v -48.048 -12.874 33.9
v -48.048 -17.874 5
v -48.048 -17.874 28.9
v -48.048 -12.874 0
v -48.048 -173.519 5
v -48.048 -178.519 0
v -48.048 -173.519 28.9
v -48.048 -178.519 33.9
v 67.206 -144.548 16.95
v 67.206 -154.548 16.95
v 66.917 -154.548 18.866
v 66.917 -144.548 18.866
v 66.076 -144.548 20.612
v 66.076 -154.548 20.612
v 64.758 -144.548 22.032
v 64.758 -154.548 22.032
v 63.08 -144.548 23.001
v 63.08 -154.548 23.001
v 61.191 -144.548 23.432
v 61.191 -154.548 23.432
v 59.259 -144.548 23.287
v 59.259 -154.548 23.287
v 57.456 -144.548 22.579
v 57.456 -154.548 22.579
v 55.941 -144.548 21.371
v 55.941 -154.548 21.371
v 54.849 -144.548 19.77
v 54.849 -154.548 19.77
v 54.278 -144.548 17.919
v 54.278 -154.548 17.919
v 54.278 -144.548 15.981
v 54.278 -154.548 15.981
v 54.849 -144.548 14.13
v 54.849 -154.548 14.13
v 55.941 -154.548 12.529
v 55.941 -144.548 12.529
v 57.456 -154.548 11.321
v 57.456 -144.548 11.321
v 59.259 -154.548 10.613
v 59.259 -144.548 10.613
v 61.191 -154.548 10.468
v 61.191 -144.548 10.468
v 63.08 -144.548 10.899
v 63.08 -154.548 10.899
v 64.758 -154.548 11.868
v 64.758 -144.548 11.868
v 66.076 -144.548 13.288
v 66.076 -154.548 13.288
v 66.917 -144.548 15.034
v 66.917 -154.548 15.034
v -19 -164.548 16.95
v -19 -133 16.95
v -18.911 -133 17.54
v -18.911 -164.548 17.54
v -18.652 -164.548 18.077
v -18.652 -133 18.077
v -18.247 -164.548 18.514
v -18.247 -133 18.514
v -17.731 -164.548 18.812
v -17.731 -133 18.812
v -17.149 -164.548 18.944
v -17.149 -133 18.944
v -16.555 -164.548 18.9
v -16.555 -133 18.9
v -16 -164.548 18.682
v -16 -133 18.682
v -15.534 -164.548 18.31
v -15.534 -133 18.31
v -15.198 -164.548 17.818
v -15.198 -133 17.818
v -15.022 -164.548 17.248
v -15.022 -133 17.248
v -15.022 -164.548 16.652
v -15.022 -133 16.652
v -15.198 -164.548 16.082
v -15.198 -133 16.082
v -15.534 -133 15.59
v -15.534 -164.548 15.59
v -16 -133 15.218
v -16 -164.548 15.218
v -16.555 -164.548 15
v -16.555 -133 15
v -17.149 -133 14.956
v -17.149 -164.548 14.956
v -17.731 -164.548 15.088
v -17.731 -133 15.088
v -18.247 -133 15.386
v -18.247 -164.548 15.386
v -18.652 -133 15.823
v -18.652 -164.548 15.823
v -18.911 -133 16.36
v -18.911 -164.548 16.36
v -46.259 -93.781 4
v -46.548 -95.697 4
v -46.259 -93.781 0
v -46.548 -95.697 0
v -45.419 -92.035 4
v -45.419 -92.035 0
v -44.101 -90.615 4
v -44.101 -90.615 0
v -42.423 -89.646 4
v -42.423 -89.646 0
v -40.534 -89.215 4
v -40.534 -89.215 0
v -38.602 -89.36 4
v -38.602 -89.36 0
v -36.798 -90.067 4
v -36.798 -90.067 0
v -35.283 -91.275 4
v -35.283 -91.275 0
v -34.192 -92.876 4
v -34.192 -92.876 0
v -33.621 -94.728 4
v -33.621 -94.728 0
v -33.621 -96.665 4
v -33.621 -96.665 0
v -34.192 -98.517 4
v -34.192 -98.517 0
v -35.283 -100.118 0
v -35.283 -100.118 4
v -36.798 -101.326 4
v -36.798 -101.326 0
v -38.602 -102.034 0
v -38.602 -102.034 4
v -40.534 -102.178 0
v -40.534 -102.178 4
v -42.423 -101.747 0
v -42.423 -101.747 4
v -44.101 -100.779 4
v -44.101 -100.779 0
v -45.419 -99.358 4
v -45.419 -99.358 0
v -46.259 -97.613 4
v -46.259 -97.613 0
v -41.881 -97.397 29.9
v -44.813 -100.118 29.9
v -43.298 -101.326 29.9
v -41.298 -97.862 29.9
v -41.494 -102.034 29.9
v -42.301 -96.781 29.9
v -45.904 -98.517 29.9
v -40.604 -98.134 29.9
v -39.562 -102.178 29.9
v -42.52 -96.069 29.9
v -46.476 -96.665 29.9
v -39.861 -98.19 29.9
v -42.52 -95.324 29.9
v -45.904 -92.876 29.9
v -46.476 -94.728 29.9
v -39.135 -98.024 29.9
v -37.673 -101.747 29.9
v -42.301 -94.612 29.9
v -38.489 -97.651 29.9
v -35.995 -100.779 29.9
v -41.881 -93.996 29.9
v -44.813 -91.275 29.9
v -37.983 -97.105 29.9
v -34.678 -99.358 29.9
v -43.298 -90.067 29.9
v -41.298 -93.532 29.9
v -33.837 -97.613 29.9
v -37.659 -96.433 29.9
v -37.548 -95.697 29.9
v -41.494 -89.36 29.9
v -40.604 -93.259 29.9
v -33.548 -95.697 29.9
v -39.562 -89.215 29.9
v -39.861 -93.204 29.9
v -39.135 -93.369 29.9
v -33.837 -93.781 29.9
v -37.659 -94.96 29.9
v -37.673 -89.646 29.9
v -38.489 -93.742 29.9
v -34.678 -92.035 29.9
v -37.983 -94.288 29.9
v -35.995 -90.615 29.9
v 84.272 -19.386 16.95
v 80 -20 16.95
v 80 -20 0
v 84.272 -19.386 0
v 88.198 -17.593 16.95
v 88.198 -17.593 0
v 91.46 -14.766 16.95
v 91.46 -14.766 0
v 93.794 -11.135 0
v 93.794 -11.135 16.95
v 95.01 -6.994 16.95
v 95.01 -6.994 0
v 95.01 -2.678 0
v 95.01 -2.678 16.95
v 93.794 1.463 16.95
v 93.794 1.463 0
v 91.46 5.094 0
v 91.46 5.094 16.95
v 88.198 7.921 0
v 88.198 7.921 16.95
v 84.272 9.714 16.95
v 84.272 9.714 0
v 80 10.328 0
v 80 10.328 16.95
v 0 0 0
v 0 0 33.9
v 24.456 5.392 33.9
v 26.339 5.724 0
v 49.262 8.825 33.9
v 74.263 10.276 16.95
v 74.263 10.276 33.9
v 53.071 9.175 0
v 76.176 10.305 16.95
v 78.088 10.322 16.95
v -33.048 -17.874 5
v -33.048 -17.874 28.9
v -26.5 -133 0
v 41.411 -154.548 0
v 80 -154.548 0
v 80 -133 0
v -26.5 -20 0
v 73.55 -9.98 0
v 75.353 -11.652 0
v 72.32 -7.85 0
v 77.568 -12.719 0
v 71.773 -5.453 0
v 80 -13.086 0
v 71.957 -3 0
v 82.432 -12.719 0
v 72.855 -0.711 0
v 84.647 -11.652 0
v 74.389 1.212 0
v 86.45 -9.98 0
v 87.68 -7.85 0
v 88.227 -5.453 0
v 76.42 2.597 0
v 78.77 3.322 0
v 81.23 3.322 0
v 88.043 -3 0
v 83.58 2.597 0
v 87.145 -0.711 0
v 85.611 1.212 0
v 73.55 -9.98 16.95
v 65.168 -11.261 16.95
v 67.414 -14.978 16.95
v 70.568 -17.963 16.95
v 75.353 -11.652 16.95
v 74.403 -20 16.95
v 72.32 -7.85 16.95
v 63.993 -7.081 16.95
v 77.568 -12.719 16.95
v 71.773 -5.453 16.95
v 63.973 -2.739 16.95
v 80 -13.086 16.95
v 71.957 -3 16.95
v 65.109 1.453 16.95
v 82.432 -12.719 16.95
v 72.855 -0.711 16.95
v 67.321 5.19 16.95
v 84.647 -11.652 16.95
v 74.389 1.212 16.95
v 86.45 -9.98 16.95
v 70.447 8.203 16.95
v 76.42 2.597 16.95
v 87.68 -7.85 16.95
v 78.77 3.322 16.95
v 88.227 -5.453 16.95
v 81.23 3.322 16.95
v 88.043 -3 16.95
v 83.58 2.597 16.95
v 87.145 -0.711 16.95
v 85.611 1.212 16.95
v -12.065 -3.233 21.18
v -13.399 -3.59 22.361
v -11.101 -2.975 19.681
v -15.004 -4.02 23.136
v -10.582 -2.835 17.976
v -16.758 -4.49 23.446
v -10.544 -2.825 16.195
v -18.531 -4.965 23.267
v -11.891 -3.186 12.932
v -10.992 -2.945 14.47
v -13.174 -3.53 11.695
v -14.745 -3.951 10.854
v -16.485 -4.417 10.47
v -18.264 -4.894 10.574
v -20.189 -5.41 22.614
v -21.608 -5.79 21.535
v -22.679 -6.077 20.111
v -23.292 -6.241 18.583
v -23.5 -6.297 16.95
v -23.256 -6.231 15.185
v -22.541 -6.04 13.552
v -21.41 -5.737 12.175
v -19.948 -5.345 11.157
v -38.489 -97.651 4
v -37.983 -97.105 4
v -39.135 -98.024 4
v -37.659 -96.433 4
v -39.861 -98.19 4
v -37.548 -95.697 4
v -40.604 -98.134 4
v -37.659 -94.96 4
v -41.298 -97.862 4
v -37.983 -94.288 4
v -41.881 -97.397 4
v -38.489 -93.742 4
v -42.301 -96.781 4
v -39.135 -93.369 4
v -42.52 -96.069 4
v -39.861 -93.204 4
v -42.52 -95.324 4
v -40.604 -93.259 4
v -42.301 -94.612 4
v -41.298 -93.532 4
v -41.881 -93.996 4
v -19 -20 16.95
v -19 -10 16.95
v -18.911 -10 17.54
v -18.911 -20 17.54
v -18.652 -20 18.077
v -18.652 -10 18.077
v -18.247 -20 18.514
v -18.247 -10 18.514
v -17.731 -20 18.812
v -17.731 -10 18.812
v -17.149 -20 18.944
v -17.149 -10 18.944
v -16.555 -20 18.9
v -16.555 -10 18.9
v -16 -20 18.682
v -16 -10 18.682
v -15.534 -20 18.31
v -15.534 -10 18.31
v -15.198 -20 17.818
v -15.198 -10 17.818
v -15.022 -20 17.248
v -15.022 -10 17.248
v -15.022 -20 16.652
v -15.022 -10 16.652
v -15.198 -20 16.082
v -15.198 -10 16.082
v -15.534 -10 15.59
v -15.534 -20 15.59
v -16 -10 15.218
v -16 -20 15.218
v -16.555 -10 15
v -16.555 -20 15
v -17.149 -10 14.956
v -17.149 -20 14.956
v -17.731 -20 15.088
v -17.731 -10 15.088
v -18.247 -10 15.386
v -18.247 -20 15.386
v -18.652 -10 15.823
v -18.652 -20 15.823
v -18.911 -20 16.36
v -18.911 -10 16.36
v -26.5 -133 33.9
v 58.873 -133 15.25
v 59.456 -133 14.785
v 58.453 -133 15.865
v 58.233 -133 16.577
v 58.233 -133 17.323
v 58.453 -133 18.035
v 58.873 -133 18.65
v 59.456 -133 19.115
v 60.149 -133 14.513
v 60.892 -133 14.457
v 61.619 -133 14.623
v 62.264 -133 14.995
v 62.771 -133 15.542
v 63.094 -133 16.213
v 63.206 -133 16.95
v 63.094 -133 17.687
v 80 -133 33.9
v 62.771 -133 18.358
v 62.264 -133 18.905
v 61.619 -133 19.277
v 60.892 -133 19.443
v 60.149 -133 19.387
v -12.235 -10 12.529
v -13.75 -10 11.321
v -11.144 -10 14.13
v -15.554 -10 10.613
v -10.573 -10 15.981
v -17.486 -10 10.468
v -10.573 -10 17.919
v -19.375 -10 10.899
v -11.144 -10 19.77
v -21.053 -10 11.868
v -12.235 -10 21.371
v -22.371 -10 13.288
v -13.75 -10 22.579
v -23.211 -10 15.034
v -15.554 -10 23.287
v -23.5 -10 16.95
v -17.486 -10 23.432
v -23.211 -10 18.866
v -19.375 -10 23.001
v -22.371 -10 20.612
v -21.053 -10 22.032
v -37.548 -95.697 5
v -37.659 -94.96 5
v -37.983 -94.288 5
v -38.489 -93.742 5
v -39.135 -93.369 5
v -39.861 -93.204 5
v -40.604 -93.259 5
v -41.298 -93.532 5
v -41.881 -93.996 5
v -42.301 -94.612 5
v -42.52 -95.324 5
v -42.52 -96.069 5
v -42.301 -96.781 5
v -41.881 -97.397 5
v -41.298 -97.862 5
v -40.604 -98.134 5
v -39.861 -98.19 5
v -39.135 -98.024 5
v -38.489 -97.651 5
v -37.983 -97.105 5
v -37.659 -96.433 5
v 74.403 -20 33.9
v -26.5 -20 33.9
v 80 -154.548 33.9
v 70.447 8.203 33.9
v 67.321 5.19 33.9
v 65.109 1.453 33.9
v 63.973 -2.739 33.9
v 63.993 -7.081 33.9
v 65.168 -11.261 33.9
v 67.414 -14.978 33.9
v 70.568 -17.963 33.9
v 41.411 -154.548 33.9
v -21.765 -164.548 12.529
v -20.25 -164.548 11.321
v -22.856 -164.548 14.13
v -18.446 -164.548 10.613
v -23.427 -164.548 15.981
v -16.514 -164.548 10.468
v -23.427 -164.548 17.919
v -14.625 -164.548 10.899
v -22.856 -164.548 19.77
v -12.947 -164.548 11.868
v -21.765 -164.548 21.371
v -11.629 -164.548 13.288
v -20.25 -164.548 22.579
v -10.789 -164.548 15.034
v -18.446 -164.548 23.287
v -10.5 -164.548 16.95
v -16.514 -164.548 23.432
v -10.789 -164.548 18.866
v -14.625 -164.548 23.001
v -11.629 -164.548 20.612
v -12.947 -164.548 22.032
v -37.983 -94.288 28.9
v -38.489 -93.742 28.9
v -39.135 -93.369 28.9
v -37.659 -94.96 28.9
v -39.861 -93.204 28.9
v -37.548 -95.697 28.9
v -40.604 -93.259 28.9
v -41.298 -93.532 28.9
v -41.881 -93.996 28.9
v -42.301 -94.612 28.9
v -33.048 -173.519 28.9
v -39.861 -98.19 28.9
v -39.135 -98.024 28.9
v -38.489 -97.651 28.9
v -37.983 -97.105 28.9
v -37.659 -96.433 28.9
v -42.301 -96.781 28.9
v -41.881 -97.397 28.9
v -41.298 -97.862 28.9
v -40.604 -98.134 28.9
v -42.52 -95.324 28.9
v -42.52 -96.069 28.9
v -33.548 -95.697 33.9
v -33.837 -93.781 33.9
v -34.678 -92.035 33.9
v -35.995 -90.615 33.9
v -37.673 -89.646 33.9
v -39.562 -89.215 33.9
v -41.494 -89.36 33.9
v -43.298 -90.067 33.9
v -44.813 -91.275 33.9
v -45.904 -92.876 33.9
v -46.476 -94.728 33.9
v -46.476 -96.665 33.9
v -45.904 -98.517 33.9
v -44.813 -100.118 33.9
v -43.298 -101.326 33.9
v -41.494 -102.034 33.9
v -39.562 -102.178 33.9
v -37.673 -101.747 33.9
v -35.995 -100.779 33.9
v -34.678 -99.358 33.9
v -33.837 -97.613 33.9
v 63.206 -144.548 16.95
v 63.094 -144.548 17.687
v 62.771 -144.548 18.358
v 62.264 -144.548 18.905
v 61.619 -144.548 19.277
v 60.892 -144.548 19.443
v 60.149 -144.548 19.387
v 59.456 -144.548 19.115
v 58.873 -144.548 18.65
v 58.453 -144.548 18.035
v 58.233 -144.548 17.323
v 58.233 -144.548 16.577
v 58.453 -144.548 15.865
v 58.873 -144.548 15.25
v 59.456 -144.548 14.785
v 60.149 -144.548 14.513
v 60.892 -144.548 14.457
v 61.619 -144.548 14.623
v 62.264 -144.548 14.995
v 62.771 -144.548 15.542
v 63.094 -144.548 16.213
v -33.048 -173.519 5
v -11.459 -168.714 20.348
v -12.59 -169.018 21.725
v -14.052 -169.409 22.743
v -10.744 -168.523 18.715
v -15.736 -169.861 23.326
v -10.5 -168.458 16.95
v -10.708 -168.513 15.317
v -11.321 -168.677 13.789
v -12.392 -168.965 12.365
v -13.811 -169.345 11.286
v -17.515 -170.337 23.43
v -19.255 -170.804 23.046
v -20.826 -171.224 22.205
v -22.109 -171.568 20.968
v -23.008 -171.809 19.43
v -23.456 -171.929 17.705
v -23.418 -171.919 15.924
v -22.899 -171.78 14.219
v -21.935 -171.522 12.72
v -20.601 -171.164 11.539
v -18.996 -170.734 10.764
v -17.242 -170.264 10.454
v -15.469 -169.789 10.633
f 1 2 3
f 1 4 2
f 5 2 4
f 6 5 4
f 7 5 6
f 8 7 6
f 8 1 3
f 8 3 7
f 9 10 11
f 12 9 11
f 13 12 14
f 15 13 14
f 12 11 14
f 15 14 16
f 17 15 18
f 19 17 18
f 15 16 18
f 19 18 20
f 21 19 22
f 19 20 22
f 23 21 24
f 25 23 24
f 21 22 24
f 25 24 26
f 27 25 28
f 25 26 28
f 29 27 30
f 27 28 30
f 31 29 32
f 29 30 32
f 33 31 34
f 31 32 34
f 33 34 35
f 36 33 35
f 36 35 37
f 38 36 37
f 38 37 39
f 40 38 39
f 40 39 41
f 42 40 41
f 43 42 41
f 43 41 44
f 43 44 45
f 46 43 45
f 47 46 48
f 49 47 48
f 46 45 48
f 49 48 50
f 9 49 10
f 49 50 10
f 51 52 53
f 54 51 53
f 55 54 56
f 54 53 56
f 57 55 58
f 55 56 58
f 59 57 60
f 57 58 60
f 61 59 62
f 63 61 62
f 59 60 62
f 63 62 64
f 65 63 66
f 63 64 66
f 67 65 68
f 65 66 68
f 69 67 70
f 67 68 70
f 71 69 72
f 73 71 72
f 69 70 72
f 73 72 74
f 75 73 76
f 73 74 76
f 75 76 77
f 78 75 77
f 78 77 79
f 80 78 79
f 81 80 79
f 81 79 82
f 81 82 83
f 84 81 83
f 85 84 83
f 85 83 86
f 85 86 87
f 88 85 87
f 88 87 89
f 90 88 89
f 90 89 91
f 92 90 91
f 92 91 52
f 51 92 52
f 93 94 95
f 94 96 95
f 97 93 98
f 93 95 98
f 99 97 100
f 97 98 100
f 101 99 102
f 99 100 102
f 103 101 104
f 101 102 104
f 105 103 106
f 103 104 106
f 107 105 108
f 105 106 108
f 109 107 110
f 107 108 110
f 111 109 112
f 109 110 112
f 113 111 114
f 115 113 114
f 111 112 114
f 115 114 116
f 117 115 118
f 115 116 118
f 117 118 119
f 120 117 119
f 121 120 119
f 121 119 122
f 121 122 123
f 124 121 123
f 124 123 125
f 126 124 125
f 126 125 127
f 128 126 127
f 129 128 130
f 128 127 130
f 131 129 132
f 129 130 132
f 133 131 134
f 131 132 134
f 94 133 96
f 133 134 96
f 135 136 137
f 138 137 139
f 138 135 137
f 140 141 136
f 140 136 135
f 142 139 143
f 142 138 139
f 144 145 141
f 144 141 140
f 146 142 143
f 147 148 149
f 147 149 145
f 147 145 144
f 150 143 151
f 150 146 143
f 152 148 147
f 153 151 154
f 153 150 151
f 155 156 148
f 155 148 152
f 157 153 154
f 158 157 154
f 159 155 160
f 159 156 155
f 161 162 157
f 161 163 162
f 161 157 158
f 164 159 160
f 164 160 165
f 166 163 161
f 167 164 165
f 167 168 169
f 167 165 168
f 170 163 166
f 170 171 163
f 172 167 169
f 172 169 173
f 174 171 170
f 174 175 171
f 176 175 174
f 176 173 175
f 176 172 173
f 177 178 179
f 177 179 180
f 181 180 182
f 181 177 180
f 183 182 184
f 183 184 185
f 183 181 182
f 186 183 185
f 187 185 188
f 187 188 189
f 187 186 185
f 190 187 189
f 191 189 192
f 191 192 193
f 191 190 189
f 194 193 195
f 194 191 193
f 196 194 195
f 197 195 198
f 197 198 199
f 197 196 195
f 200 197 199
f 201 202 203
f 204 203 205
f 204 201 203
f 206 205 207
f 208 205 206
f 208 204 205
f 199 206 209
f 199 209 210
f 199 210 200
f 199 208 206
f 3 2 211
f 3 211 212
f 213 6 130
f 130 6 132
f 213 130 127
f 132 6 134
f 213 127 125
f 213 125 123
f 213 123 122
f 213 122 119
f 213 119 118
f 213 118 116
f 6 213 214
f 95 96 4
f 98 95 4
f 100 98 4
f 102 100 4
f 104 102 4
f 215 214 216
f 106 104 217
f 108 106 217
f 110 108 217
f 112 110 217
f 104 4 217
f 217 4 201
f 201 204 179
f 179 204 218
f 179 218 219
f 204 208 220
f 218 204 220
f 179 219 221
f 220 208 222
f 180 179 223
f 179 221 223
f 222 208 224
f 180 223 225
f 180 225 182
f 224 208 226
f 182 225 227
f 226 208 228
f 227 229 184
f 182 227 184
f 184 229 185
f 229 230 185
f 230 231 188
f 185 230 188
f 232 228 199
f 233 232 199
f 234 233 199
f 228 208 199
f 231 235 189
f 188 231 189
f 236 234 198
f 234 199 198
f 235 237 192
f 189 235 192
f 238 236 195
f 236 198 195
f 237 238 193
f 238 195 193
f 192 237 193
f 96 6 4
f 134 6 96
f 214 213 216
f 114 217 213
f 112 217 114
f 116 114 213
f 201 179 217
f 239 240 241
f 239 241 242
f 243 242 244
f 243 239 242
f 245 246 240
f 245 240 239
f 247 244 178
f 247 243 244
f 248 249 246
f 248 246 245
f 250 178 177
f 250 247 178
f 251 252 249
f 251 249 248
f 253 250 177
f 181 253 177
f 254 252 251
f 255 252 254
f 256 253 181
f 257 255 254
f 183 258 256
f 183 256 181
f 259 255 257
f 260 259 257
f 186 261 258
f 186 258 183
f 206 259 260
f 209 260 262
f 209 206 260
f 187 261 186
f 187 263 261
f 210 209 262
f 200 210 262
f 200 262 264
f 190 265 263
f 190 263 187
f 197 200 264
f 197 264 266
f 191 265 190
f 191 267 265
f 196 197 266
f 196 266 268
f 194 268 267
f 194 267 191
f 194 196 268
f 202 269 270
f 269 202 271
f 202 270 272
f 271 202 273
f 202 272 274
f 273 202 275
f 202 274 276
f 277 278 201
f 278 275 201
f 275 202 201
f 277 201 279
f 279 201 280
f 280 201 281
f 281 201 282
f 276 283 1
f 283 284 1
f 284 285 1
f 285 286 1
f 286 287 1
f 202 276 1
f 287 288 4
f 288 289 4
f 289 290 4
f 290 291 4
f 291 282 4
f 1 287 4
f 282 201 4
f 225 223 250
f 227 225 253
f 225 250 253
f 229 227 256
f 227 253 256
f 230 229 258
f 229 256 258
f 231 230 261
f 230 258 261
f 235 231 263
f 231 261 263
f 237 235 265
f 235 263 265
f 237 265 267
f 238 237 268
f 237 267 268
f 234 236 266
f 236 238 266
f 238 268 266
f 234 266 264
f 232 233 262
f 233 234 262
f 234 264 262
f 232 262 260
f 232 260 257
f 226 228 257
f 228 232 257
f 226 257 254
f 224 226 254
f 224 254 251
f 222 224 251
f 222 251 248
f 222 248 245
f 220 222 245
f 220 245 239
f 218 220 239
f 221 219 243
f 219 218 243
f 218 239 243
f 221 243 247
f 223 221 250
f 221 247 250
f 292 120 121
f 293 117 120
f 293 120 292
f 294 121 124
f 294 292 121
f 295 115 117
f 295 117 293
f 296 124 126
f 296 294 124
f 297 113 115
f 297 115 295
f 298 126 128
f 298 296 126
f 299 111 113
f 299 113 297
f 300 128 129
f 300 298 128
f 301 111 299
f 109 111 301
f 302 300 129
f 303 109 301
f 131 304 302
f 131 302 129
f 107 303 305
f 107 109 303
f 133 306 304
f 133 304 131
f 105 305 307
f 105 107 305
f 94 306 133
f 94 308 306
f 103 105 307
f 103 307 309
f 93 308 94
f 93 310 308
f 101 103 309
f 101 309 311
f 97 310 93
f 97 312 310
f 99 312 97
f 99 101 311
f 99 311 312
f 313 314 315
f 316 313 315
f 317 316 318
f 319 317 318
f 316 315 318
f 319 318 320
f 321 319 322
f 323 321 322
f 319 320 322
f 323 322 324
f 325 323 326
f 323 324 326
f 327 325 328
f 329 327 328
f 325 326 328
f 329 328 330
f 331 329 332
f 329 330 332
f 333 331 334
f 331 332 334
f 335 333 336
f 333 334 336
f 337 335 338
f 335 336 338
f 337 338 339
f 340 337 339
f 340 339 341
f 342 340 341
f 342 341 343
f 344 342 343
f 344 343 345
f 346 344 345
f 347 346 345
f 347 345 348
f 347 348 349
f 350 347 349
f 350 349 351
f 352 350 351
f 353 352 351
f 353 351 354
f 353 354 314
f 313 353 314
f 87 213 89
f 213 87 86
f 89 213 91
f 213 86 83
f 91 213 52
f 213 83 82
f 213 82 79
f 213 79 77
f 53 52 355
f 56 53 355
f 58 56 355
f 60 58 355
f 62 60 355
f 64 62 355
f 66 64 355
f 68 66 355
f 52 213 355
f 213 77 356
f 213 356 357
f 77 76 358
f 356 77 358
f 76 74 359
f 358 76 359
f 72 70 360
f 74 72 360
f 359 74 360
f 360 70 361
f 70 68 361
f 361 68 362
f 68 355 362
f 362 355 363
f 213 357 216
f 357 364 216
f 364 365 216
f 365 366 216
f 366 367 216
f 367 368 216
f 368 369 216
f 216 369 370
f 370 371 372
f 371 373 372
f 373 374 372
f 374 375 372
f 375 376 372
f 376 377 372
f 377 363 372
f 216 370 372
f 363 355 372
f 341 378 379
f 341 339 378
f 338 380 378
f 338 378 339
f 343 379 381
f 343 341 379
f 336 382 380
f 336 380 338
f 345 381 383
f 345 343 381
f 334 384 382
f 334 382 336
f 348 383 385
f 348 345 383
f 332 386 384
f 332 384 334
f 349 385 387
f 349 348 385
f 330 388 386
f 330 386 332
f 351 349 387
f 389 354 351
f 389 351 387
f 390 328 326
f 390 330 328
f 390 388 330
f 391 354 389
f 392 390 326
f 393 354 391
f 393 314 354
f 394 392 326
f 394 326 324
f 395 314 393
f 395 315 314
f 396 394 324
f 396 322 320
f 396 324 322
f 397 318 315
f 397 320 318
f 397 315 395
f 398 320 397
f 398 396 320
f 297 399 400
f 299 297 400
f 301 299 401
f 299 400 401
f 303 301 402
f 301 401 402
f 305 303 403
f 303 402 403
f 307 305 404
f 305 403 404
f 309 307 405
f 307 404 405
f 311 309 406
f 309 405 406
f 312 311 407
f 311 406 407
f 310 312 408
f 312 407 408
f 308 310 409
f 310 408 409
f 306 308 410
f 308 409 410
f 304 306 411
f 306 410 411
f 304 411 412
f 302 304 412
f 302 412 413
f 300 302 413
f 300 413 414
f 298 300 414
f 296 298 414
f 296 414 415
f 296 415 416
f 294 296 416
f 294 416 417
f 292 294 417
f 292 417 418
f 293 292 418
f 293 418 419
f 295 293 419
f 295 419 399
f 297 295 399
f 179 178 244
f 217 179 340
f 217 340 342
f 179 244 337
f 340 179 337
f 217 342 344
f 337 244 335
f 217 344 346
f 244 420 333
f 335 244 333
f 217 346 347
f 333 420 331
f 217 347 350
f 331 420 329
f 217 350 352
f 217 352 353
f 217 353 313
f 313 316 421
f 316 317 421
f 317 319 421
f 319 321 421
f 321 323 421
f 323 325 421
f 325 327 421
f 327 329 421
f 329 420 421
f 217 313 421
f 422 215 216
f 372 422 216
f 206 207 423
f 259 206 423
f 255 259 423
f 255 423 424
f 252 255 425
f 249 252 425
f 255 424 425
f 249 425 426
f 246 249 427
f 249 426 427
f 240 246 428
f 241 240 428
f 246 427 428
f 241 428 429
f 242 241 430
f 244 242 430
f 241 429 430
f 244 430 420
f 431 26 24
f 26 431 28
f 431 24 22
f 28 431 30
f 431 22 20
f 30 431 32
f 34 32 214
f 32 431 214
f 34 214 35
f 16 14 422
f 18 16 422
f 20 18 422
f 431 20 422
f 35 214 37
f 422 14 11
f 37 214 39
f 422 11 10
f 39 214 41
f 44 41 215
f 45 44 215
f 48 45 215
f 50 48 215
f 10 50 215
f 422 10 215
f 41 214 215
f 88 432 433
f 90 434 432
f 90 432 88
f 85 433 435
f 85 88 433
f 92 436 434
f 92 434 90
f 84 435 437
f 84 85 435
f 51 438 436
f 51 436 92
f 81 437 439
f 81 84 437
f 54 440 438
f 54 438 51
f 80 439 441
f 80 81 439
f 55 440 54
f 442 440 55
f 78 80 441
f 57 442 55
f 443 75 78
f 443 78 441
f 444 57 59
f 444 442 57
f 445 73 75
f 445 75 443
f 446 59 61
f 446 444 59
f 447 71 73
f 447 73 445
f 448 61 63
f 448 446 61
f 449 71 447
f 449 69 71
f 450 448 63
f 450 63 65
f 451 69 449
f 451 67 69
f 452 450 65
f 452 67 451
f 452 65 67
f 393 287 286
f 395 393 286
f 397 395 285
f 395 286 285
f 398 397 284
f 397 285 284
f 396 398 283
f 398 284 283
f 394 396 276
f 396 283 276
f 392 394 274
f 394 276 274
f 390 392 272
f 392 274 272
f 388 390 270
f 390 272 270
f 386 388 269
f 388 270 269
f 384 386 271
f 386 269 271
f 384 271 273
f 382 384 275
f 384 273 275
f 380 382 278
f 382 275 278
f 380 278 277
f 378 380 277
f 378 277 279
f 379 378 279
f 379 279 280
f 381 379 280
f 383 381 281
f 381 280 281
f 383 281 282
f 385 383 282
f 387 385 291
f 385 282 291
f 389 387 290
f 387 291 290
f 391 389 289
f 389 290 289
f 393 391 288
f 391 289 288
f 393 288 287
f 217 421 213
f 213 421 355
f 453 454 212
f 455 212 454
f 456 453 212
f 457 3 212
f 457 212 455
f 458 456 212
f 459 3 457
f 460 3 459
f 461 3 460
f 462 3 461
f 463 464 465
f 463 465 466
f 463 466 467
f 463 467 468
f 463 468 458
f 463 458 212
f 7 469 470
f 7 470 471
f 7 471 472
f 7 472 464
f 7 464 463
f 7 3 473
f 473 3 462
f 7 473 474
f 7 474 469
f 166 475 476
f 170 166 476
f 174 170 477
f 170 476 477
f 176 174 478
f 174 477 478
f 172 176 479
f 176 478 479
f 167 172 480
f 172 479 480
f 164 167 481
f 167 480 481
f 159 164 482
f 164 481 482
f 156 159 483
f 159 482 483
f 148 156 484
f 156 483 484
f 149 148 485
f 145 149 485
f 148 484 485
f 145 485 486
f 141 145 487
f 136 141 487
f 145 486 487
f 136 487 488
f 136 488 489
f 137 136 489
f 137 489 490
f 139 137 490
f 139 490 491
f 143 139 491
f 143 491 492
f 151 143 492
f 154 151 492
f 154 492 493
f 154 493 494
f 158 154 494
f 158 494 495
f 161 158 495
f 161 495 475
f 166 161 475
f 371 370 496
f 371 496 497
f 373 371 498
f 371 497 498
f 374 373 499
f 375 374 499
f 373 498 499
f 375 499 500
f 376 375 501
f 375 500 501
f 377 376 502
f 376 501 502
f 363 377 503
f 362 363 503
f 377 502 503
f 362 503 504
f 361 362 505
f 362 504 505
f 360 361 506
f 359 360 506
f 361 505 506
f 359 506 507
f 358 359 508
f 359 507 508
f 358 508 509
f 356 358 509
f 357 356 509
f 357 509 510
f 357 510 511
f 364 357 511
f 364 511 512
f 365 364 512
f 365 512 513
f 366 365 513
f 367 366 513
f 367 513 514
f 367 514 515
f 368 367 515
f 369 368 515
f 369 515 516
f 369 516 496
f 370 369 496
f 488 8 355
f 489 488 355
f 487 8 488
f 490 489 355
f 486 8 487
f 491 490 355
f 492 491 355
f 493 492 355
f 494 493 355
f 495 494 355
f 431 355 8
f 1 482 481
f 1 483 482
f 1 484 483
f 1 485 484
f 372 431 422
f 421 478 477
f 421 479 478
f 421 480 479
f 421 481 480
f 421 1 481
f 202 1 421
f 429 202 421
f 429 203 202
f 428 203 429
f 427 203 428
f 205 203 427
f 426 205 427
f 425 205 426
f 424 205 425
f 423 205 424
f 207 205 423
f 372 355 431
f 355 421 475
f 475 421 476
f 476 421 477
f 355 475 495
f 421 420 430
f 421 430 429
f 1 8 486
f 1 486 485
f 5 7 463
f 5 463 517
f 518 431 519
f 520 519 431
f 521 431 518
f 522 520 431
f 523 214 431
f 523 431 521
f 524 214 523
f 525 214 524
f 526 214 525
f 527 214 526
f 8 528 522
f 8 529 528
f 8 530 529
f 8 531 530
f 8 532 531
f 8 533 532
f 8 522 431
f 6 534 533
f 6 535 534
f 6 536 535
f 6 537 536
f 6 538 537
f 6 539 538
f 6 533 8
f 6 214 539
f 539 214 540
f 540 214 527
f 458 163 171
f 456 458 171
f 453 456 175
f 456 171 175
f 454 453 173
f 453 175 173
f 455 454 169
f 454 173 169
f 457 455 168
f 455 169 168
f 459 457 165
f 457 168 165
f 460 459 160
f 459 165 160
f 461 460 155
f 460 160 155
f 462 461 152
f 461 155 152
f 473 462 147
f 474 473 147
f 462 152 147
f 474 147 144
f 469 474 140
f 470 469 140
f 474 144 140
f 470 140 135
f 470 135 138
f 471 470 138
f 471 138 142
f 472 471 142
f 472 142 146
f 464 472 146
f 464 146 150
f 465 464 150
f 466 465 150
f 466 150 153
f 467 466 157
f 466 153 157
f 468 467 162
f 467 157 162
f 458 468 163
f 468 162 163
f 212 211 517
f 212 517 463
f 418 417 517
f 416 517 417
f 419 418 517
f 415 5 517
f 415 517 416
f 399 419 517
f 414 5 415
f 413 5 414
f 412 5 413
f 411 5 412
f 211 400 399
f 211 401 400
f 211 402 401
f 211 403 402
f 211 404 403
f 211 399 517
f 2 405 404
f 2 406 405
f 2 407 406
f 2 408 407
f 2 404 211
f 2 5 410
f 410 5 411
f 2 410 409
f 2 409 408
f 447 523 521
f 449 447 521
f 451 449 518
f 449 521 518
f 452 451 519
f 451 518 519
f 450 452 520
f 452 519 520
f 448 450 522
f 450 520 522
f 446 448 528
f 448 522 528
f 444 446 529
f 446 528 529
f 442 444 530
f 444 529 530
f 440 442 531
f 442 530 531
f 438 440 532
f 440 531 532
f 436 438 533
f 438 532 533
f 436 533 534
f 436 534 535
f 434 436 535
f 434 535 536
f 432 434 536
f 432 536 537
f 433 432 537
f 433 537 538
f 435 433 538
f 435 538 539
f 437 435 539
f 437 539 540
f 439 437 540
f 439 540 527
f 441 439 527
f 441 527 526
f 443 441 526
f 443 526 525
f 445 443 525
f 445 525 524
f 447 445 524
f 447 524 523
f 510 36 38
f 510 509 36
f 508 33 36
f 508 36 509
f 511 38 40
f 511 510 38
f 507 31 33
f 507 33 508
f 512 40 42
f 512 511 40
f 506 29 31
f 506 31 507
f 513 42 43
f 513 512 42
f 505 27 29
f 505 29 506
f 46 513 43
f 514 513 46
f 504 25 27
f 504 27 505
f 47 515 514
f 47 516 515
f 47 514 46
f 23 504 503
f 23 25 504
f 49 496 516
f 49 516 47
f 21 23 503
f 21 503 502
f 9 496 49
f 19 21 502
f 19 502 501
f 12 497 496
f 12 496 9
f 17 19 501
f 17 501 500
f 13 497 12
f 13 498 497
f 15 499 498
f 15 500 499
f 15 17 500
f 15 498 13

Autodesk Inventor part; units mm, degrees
ref_plane "YZ Plane" through (0, 0, 0) normal (1, 0, 0) x (0, 1, 0)
ref_plane "XZ Plane" through (0, 0, 0) normal (0, 1, 0) x (-1, 0, 0)
sketch "Sketch1" plane through (0, 0, 0) normal (0, 0, 1) x (1, 0, 0)
  line L0 (0, 0) -> (160, 0) construction
  line L1 (160, 0) -> (118.589, -154.5481) construction
  line L2 (0, 0) -> (41.411, -154.5481) construction
  line L3 (41.411, -154.5481) -> (118.589, -154.5481)
  circle A0 centre (235.8871, -103.156) radius 80 construction
  line L4 (160, 0) -> (256.5926, -25.8819)
  line L5 (118.589, -154.5481) -> (215.1815, -180.43)
  arc A1 (215.1815, -180.43) -> (256.5926, -25.8819) centre (235.8871, -103.156) ccw
  circle A2 centre (-75.8871, -103.156) radius 80 construction
  line L6 (0, 0) -> (-96.5926, -25.8819)
  line L7 (41.411, -154.5481) -> (-55.1815, -180.43)
  arc A3 (-96.5926, -25.8819) -> (-55.1815, -180.43) centre (-75.8871, -103.156) ccw
  arc A4 (160, 0) -> (0, 0) centre (80, -304.672) ccw
  dimension "d0" = 160
  dimension "d1" = 160
  dimension "d2" = 160
  dimension "d3" = 75
  dimension "d4" = 75
  dimension "d5" = 160
  dimension "d6" = 100
  dimension "d7" = 160
  dimension "d9" = 100
  dimension "d56" = 315
extrude "Extrusion1" add sketch "Sketch1" along normal blind 33.9
sketch "Sketch2" plane through (0, 0, 33.9) normal (0, 0, 1) x (1, 0, 0)
  line L0 (-26.5, -133) -> (186.5, -133)
  line L1 (186.5, -133) -> (186.5, -20)
  line L2 (186.5, -20) -> (-26.5, -20)
  line L3 (-26.5, -20) -> (-26.5, -133)
  line L4 (0, 0) -> (-96.5926, -25.8819) projected
  arc A0 (160, 0) -> (0, 0) centre (80, -304.672) ccw projected
  line L5 (0, 0) -> (160, 0)
  point P0 (80, -20)
  point P1 (80, 0)
  dimension "d12" = 213
  dimension "d13" = 113
  dimension "d57" = 20
extrude "Extrusion2" cut sketch "Sketch2" against normal through all contours L3 L2 L1 L0
sketch "Sketch3" plane through (0, 0, 33.9) normal (0, 0, 1) x (1, 0, 0)
  line L0 (186.5, -20) -> (186.5, -133) construction
  line L1 (186.5, -133) -> (-26.5, -133) construction
  line L2 (-26.5, -133) -> (-26.5, -20) construction
  line L3 (-26.5, -20) -> (186.5, -20) construction
  line L4 (0, 0) -> (-96.5926, -25.8819) construction
  arc A0 (-96.5926, -25.8819) -> (-55.1815, -180.43) centre (-75.8871, -103.156) ccw construction
  line L5 (-55.1815, -180.43) -> (41.411, -154.5481) construction
  line L6 (41.411, -154.5481) -> (118.589, -154.5481) construction
  line L7 (118.589, -154.5481) -> (215.1815, -180.43) construction
  arc A1 (215.1815, -180.43) -> (256.5926, -25.8819) centre (235.8871, -103.156) ccw construction
  line L8 (256.5926, -25.8819) -> (160, 0) construction
  line L9 (-48.0481, -154.5481) -> (208.0481, -154.5481) construction
  line L10 (208.0481, -154.5481) -> (208.0481, 10.328) construction
  line L11 (-48.0481, 10.328) -> (-48.0481, -154.5481) construction
  line L12 (-48.0481, 10.328) -> (-48.0481, -178.5186)
  line L13 (-55.1815, -180.43) -> (41.411, -154.5481) projected
  line L14 (208.0481, 10.328) -> (208.0481, -178.5186)
  line L15 (118.589, -154.5481) -> (215.1815, -180.43) projected
  line L16 (-48.0481, -178.5186) -> (208.0481, -178.5186)
  line L17 (-48.0481, 10.328) -> (208.0481, 10.328)
  line L18 (-157.6505, -218.8456) -> (317.6505, -218.8456)
  line L19 (317.6505, -218.8456) -> (317.6505, 50.655)
  line L20 (317.6505, 50.655) -> (-157.6505, 50.655)
  line L21 (-157.6505, 50.655) -> (-157.6505, -218.8456)
  arc A2 (160, 0) -> (0, 0) centre (80, -304.672) ccw projected
  point P0 (80, -154.5481)
  point P1 (80, 10.328)
  point P2 (208.0481, -84.0953)
  point P3 (317.6505, -84.0953)
  point P4 (80, 10.328)
  point P5 (80, -218.8456)
  dimension "d22" = 269.5006
  dimension "d23" = 475.3011
extrude "Extrusion3" cut sketch "Sketch3" against normal through all
sketch "Sketch5" plane through (0, 0, 33.9) normal (0, 0, 1) x (1, 0, 0)
  line L0 (118.589, -154.5481) -> (208.0481, -178.5186) projected
  line L1 (208.0481, -178.5186) -> (80, -178.5186)
  line L2 (80, -178.5186) -> (80, 10.328)
  line L3 (80, 10.328) -> (208.0481, 10.328)
  line L4 (208.0481, 10.328) -> (208.0481, -178.5186)
  arc A0 (160, 0) -> (0, 0) centre (80, -304.672) ccw projected
extrude "Extrusion4" cut sketch "Sketch5" against normal through all
sketch "Sketch6" plane through (0, 0, 0) normal (0, 1, 0) x (-1, 0, 0)
  circle A0 centre (17, 16.95) radius 2
  line L0 (26.5, 33.9) -> (26.5, 0) projected
  point P0 (26.5, 16.95)
  dimension "d24" = 4
  dimension "d58" = 9.5
extrude "Extrusion5" cut sketch "Sketch6" along normal through all both and the other way through all
sketch "Sketch7" plane through (0, 0, 0) normal (0, 1, 0) x (-1, 0, 0)
  circle A0 centre (17, 16.95) radius 2 projected
  circle A1 centre (17, 16.95) radius 6.5
  dimension "d59" = 13
extrude "Extrusion6" cut sketch "Sketch7" against normal blind 10
ref_plane "Work Plane1" through (41.411, -174.5481, 0) normal (0, -1, 0) x (1, 0, 0)
sketch "Sketch8" plane through (41.411, -174.5481, 0) normal (0, -1, 0) x (1, 0, 0)
  circle A0 centre (-58.411, 16.95) radius 2 projected
  circle A1 centre (-58.411, 16.95) radius 6.5
  point P0 (-41.411, 0)
  dimension "d32" = 13
extrude "Extrusion7" cut sketch "Sketch8" against normal blind 10
sketch "Sketch11" plane through (41.411, -154.5481, 0) normal (0, -1, 0) x (1, 0, 0)
  line L0 (0, 33.9) -> (38.589, 33.9) projected
  line L1 (0, 0) -> (0, 33.9) projected
  line L2 (0, 0) -> (38.589, 0) projected
  line L3 (38.589, 0) -> (38.589, 33.9) projected
  circle A0 centre (19.2945, 16.95) radius 2.5
  circle A1 centre (19.2945, 16.95) radius 6.5
  point P0 (-41.411, 0)
  point P1 (0, 16.95)
  point P2 (19.2945, 33.9)
  dimension "d73" = 5
  dimension "d74" = 13
extrude "Extrusion10" cut sketch "Sketch11" against normal blind 10 contours A1
sketch "Sketch12" plane through (-48.0481, -178.5186, 33.9) normal (-1, 0, 0) x (0, 0, 1)
  line L0 (-33.9, 0) -> (-33.9, 165.6442) projected
  line L1 (0, 0) -> (-33.9, 0) projected
  line L2 (0, 165.6442) -> (0, 0) projected
  line L3 (-33.9, 165.6442) -> (0, 165.6442) projected
  line L4 (-5, 5) -> (-28.9, 5)
  line L5 (-28.9, 5) -> (-28.9, 160.6442)
  line L6 (-28.9, 160.6442) -> (-5, 160.6442)
  line L7 (-5, 160.6442) -> (-5, 5)
  point P0 (-33.9, 178.5186)
  dimension "d43" = 5
extrude "Extrusion11" cut sketch "Sketch12" against normal blind 15 contours L4 L5 L6 L7
sketch "Sketch13" plane through (0, 0, 33.9) normal (0, 0, 1) x (1, 0, 0)
  circle A0 centre (-40.0481, -95.6966) radius 2.5
  line L0 (-48.0481, -12.8745) -> (-48.0481, -178.5186) projected
  point P0 (0, 0)
  point P1 (-48.0481, -95.6966)
  dimension "d46" = 5
  dimension "d47" = 8
extrude "Extrusion12" cut sketch "Sketch13" against normal through all
sketch "Sketch14" plane through (0, 0, 33.9) normal (0, 0, 1) x (1, 0, 0)
  circle A0 centre (-40.0481, -95.6966) radius 2.5 projected
  circle A1 centre (-40.0481, -95.6966) radius 6.5
  point P0 (0, 0)
  dimension "d50" = 13
extrude "Extrusion13" cut sketch "Sketch14" against normal blind 4
sketch "Sketch15" plane through (0, 0, 0) normal (0, 0, -1) x (-1, 0, 0)
  circle A0 centre (40.0481, -95.6966) radius 2.5 projected
  circle A1 centre (40.0481, -95.6966) radius 2.5 projected
  circle A2 centre (40.0481, -95.6966) radius 6.5
  point P0 (0, 0)
  dimension "d53" = 13
extrude "Extrusion14" cut sketch "Sketch15" against normal blind 4
sketch "Sketch16" plane through (0, 0, 33.9) normal (0, 0, 1) x (1, 0, 0)
  line L0 (80, -20) -> (80, 10.328) construction
  circle A0 centre (80, -4.836) radius 8.25 construction
  circle A1 centre (80, -4.836) radius 15.164 construction
  arc A2 (80, -20) -> (80, 10.328) centre (80, -4.836) ccw
  arc A3 (80, -13.086) -> (80, 3.414) centre (80, -4.836) ccw
  arc A4 (80, 10.328) -> (0, 0) centre (80, -304.672) ccw projected
  line L1 (80, 10.328) -> (80, 3.414)
  line L2 (80, -13.086) -> (80, -20)
  dimension "d62" = 16.5
extrude "Extrusion15" add sketch "Sketch16" against normal blind 33.9
sketch "Sketch17" plane through (0, 0, 33.9) normal (0, 0, 1) x (1, 0, 0)
  arc A0 (80, -13.086) -> (80, 3.414) centre (80, -4.836) ccw construction
  circle A1 centre (80, -4.836) radius 8.25
  point P0 (0, 0)
extrude "Extrusion16" cut sketch "Sketch17" against normal through all
sketch "Sketch19" plane through (0, 0, 33.9) normal (0, 0, 1) x (1, 0, 0)
  circle A0 centre (80, -4.836) radius 8.25 projected
  arc A1 (80, -20) -> (80, 10.328) centre (80, -4.836) ccw projected
  circle A2 centre (80, -4.836) radius 15.164 construction
  circle A3 centre (80, -4.836) radius 16.164
  point P0 (0, 0)
  dimension "d72" = 1
extrude "Extrusion18" cut sketch "Sketch19" against normal blind 16.95
sketch "Sketch20" plane through (60.7055, -154.5481, 16.95) normal (0, -1, 0) x (1, 0, 0)
  circle A0 centre (0, 0) radius 2.5 projected
  point P0 (-60.7055, -16.95)
extrude "Extrusion19" cut sketch "Sketch20" against normal blind 50
properties part number "Riser Base" material "ABS Plastic"
